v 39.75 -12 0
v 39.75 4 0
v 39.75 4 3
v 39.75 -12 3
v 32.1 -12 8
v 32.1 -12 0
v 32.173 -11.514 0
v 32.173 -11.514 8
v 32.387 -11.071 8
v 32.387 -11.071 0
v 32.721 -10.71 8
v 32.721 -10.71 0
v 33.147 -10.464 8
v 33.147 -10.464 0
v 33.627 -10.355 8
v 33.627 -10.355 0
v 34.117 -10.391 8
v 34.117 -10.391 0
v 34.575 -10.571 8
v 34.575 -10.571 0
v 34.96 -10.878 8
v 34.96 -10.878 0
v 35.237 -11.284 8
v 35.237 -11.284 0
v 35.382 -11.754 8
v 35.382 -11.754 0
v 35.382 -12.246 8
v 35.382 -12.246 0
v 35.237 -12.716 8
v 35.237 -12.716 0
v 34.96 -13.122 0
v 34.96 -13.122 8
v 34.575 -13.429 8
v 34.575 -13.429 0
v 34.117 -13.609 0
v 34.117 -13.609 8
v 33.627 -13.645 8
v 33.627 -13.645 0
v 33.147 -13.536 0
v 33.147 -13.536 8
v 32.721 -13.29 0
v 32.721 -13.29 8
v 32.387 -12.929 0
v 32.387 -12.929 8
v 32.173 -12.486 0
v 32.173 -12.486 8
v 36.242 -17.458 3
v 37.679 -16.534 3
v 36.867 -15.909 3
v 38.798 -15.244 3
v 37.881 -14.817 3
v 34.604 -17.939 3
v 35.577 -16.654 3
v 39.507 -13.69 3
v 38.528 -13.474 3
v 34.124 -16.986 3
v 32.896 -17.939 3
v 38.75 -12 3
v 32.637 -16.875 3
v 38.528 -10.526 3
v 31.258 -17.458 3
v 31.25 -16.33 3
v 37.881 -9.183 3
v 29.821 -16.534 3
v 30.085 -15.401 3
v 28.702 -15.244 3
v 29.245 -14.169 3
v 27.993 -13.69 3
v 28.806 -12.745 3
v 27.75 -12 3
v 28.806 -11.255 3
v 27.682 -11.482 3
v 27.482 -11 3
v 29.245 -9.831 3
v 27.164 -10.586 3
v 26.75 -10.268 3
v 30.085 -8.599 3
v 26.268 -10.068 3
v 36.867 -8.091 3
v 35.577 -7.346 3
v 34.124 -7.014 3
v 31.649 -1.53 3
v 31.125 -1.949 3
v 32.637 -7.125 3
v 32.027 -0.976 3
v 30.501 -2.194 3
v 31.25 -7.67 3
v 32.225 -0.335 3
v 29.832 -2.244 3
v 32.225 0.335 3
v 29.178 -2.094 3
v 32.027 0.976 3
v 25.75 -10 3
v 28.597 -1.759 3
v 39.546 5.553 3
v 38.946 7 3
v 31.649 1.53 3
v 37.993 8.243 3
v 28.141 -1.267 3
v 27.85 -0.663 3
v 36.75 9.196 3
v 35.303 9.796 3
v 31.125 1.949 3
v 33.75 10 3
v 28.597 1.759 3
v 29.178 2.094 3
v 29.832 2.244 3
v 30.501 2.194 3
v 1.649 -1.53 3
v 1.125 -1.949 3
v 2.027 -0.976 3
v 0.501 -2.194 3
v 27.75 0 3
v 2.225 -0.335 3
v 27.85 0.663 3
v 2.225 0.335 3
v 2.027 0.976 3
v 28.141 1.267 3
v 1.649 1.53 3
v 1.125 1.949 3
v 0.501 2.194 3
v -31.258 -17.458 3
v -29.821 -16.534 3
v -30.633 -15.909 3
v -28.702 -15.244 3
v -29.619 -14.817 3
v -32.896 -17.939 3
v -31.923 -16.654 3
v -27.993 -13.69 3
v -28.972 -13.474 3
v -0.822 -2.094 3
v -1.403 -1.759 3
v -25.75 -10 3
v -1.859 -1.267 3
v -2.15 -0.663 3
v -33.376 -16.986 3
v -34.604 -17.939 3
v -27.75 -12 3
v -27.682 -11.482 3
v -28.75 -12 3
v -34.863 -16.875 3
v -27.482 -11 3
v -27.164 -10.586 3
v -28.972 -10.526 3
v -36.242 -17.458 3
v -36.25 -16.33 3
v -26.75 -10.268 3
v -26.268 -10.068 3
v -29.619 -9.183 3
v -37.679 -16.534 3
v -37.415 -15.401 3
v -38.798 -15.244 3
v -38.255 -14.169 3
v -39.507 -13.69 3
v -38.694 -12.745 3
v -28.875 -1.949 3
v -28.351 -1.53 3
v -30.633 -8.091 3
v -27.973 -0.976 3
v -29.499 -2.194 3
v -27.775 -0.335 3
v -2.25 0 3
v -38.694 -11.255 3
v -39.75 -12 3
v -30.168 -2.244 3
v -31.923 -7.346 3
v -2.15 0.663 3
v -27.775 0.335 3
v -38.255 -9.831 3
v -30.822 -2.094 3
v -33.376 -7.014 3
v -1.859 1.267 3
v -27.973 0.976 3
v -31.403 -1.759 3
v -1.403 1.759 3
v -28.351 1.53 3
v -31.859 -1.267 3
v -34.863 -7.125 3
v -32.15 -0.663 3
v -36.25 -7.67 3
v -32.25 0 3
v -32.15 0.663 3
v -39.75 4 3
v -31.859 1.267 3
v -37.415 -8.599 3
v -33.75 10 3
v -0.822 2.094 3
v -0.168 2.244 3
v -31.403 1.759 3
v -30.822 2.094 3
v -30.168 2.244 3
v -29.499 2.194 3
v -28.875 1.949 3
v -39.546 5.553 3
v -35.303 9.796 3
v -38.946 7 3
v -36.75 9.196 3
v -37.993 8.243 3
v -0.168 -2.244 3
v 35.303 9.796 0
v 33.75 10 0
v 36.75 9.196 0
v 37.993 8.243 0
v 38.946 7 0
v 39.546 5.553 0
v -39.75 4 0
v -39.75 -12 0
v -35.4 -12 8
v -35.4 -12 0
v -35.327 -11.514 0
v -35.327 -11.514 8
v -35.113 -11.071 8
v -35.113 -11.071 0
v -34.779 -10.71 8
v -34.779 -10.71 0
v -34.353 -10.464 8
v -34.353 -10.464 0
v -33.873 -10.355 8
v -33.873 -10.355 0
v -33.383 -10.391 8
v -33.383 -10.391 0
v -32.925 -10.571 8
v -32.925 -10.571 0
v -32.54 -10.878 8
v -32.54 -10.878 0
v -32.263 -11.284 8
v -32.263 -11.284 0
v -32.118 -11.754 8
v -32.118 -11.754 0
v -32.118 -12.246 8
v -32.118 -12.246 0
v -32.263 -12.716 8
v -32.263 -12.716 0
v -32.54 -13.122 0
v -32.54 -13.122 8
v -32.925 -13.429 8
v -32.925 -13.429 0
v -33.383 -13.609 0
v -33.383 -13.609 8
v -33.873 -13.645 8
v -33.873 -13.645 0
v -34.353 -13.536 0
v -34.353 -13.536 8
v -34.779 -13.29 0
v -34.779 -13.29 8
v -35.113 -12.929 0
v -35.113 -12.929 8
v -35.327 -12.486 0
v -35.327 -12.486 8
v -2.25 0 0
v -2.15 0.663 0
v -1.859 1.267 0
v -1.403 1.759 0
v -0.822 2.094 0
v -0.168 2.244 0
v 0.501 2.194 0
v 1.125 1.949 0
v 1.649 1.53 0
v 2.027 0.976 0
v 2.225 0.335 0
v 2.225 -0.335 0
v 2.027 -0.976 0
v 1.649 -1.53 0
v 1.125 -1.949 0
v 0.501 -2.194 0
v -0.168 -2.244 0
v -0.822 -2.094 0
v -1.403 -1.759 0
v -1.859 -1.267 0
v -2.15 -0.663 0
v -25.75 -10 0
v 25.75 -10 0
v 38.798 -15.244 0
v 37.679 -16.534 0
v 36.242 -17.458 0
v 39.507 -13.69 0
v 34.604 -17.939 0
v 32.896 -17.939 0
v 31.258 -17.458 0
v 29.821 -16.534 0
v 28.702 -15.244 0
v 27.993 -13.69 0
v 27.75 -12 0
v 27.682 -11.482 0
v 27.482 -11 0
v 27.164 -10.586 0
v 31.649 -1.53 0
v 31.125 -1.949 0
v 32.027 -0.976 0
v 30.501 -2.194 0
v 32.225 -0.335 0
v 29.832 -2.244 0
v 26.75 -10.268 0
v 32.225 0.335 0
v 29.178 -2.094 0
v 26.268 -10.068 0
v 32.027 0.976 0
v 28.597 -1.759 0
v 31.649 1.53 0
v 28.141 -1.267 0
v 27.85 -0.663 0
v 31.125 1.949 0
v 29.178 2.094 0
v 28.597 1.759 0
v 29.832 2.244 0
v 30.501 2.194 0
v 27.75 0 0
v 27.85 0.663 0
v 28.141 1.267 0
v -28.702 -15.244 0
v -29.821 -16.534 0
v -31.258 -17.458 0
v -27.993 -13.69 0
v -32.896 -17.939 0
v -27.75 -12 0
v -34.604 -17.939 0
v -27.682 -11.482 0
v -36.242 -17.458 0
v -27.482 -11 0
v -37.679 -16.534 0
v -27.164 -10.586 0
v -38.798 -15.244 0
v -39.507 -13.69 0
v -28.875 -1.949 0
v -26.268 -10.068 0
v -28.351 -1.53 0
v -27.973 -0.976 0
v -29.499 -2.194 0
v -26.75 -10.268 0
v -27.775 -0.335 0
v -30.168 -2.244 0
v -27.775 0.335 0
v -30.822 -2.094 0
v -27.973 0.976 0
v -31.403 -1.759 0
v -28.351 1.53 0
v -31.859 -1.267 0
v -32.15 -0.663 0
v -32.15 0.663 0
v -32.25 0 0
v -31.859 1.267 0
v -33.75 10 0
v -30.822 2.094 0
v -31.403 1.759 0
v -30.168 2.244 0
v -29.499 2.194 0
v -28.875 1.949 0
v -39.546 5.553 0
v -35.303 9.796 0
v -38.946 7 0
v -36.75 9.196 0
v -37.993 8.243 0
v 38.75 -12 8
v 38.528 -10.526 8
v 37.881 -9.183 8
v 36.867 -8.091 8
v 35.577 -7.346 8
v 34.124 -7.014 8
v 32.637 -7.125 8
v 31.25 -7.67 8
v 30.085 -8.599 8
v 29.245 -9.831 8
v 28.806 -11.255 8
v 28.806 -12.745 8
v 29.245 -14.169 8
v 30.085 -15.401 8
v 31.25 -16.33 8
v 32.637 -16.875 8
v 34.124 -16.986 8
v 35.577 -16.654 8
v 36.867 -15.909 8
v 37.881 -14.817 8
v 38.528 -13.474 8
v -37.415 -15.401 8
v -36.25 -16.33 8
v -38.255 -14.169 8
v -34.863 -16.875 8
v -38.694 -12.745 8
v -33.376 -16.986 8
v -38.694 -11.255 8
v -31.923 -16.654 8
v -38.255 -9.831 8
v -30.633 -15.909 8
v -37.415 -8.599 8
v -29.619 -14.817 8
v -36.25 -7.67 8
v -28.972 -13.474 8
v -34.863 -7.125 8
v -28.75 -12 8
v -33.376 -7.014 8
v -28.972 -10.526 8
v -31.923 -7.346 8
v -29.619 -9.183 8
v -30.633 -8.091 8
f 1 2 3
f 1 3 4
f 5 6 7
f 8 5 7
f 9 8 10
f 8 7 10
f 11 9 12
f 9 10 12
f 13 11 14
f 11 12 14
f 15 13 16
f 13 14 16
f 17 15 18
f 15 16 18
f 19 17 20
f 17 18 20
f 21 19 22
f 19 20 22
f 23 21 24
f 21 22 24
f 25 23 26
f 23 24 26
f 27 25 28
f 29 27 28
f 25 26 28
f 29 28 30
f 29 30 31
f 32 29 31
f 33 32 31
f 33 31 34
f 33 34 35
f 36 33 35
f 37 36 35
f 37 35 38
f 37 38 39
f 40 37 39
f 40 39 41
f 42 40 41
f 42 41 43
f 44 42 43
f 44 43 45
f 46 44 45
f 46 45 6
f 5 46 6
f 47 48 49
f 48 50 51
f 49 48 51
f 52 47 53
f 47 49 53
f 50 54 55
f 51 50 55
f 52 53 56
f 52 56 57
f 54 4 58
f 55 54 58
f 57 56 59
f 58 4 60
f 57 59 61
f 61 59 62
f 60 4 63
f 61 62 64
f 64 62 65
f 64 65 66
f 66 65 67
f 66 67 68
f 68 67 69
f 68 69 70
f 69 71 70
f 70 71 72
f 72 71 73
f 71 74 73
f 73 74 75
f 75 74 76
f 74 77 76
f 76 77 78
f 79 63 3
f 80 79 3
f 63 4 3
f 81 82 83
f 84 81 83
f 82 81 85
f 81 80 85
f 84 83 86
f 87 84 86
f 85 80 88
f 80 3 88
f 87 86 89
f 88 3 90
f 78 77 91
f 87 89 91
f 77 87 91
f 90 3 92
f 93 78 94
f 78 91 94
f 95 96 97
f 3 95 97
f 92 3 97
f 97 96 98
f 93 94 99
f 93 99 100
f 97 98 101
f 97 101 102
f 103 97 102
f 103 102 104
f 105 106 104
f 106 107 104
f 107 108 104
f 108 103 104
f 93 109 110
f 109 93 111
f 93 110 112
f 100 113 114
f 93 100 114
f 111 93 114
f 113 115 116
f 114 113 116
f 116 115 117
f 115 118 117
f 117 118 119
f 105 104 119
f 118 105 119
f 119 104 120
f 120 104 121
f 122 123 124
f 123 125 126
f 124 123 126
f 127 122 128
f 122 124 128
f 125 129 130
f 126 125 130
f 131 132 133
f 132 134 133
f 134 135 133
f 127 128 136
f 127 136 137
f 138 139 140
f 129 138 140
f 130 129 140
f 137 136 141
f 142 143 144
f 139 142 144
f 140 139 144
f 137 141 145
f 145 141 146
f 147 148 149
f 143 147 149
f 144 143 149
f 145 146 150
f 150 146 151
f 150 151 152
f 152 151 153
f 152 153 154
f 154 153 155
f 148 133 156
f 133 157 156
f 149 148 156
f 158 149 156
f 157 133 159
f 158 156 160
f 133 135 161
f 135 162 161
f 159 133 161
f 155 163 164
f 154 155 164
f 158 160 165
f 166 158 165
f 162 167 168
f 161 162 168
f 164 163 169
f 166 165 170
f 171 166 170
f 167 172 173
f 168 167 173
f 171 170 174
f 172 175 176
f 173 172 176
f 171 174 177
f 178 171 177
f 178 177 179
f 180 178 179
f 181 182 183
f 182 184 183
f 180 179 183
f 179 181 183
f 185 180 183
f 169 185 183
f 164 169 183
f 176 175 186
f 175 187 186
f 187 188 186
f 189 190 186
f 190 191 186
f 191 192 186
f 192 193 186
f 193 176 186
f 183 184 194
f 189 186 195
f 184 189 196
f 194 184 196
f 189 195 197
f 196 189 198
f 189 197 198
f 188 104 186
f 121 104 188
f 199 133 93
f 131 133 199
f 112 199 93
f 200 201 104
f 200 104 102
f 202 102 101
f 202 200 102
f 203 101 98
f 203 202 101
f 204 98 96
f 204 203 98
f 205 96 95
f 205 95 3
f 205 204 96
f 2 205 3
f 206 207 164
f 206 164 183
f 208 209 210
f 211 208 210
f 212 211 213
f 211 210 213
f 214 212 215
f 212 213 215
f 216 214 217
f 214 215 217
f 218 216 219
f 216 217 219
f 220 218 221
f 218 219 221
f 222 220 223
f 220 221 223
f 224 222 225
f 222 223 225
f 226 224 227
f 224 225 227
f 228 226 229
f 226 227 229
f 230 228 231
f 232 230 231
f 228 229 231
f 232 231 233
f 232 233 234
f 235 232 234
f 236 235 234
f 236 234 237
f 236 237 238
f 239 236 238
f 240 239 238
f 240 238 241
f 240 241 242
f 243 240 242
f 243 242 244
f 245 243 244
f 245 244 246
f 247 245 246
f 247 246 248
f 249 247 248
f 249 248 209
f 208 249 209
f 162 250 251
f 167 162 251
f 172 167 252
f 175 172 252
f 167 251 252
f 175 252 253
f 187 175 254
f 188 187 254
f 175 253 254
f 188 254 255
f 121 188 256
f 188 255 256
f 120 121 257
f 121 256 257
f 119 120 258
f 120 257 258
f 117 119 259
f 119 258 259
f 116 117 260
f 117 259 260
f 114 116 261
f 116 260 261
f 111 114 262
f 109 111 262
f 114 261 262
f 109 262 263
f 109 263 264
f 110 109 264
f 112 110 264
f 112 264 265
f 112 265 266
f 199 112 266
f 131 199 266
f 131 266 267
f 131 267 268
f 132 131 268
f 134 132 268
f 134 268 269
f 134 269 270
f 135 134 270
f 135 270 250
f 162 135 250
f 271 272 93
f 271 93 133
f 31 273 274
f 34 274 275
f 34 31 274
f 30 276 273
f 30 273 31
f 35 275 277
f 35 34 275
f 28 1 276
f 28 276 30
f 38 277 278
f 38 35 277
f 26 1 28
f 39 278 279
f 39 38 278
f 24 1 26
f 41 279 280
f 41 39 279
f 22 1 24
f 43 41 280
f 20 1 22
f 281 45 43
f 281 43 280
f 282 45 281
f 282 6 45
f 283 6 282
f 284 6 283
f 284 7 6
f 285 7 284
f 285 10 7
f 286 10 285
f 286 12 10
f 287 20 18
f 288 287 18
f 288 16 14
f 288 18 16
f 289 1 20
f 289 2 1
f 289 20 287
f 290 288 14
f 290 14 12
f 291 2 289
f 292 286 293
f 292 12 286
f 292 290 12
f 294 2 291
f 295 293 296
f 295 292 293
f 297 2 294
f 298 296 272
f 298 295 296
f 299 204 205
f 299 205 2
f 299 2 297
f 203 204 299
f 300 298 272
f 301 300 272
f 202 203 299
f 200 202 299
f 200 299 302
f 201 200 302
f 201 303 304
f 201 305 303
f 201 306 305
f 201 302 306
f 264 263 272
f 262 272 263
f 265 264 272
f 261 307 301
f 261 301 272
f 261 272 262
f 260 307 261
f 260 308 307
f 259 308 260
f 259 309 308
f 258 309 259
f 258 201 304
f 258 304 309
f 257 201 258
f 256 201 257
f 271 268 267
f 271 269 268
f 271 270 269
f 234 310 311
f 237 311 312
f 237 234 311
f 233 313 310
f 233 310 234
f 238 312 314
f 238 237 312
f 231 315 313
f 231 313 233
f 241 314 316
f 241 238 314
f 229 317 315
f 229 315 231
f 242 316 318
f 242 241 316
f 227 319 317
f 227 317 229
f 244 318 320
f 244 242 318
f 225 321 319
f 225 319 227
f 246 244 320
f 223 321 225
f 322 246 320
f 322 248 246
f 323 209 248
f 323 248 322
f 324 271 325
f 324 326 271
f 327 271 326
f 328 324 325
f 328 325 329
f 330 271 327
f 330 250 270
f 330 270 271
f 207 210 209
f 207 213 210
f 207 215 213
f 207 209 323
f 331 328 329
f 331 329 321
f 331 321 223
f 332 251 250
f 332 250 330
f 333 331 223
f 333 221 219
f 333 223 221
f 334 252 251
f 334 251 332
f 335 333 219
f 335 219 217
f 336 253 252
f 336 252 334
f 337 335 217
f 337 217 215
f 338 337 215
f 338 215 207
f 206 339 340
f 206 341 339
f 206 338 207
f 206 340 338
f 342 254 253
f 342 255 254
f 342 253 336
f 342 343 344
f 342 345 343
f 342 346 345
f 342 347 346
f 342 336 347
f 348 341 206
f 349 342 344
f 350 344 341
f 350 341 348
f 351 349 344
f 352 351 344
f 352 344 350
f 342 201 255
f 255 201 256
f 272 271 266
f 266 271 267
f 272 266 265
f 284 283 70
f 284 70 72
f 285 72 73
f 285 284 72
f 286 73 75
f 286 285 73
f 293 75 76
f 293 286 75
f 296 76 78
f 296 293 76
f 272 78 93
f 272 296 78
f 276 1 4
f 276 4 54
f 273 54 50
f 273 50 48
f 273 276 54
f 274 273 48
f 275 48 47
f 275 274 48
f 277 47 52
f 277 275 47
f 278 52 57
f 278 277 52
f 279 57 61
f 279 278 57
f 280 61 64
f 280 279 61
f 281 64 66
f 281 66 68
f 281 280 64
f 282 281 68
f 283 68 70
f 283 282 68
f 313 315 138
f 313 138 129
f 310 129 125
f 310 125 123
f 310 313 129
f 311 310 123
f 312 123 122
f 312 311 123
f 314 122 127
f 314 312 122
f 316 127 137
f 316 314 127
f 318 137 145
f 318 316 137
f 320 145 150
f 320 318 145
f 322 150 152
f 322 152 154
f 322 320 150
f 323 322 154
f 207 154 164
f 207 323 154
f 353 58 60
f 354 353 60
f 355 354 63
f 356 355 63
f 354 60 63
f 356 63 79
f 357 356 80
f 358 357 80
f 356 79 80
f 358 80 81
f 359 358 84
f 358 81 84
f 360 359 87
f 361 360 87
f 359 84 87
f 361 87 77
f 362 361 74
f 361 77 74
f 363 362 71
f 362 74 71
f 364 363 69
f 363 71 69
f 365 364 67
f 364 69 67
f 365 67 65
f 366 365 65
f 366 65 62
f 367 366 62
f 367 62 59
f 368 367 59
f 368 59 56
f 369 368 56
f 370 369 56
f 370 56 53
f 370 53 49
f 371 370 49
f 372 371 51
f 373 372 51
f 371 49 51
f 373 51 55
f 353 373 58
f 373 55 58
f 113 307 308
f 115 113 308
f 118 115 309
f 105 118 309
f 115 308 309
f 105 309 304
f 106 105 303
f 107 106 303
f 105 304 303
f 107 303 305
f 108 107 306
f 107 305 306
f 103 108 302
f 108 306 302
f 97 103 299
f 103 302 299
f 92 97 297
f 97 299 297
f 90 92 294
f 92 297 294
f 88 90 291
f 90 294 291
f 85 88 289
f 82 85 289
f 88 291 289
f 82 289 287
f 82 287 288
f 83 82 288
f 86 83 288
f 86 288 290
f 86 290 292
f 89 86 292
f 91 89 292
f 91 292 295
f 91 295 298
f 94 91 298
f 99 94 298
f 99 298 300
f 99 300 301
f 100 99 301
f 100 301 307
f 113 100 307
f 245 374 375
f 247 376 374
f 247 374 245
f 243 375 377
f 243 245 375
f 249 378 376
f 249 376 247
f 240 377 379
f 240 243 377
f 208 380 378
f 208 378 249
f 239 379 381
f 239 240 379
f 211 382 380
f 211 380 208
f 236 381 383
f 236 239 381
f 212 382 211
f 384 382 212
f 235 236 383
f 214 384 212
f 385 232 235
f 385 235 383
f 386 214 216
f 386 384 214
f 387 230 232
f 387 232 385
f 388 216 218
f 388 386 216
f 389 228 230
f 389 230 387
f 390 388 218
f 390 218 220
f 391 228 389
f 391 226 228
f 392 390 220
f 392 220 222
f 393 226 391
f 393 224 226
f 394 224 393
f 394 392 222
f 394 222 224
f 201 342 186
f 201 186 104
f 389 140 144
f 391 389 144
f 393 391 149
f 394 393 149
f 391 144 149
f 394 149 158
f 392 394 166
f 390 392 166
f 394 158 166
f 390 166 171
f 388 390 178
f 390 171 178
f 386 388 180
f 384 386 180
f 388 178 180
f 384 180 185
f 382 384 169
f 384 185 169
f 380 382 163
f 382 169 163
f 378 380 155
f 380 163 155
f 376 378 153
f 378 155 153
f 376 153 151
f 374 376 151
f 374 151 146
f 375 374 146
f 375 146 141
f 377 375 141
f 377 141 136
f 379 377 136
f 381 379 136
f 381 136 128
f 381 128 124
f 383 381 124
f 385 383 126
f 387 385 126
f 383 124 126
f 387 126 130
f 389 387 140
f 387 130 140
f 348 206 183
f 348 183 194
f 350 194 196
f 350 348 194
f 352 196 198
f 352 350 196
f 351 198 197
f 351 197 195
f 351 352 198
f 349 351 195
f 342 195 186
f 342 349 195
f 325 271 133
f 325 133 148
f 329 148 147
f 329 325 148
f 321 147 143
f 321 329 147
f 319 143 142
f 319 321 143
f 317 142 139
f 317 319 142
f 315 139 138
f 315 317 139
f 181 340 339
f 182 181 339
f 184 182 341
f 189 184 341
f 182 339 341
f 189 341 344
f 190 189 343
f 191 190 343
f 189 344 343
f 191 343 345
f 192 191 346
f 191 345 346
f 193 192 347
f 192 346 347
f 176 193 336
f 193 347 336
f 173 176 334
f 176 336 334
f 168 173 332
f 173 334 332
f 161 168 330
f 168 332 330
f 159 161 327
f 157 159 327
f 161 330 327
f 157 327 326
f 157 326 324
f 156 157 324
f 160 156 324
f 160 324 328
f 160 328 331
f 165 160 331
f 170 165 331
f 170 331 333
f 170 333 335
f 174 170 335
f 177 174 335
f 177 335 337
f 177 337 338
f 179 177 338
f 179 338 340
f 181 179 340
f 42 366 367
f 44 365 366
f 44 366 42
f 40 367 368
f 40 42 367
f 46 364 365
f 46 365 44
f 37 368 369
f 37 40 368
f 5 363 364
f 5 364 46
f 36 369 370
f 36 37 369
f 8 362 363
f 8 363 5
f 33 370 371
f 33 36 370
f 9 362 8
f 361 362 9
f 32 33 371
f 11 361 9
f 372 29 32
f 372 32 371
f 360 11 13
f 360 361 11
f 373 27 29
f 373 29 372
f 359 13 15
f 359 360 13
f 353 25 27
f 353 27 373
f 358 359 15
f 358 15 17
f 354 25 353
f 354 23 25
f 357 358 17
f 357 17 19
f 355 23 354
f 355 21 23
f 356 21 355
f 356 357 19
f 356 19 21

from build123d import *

# Parameters (mm, degrees)
EXTRUDE_1_DEPTH    = 3
SKETCH_4_R         = 5
EXTRUDE_2_DEPTH    = 5
M4X0_7_1_D         = 3.3
HOLE_WIZARD_M4_1_D = 4.5


with BuildPart() as part:
    # 草圖1 → 填料-伸長1 (new body)
    with BuildSketch(Plane.XY):
        with BuildLine():
            Line((-33.75, 10), (33.75, 10))
            ThreePointArc((33.75, 10), (37.992640687, 8.242640687), (39.75, 4))
            Line((39.75, 4), (39.75, -12))
            ThreePointArc((39.75, -12), (33.75, -18), (27.75, -12))
            ThreePointArc((27.75, -12), (27.164213562, -10.585786438), (25.75, -10))
            Line((25.75, -10), (-25.75, -10))
            ThreePointArc((-25.75, -10), (-27.164213562, -10.585786438), (-27.75, -12))
            ThreePointArc((-27.75, -12), (-33.75, -18), (-39.75, -12))
            Line((-39.75, -12), (-39.75, 4))
            ThreePointArc((-39.75, 4), (-37.992640687, 8.242640687), (-33.75, 10))
        make_face()
    extrude(amount=EXTRUDE_1_DEPTH)

    # 草圖4 → 填料-伸長2 (add)
    with BuildSketch(Plane.XY.offset(3)):
        with Locations((-33.75, -12)):
            Circle(SKETCH_4_R)
        with Locations((33.75, -12)):
            Circle(SKETCH_4_R)
    extrude(amount=EXTRUDE_2_DEPTH)

    # M4x0.7 螺紋孔1 (through all)
    with Locations(Plane.XY.offset(8)):
        with Locations((-33.75, -12), (33.75, -12)):
            Hole(M4X0_7_1_D / 2)

    # M4 餘隙孔1 (through all)
    with Locations(Plane.XY.offset(3)):
        with Locations((-30, 0), (30, 0), (0, 0)):
            Hole(HOLE_WIZARD_M4_1_D / 2)


solid = part.part
